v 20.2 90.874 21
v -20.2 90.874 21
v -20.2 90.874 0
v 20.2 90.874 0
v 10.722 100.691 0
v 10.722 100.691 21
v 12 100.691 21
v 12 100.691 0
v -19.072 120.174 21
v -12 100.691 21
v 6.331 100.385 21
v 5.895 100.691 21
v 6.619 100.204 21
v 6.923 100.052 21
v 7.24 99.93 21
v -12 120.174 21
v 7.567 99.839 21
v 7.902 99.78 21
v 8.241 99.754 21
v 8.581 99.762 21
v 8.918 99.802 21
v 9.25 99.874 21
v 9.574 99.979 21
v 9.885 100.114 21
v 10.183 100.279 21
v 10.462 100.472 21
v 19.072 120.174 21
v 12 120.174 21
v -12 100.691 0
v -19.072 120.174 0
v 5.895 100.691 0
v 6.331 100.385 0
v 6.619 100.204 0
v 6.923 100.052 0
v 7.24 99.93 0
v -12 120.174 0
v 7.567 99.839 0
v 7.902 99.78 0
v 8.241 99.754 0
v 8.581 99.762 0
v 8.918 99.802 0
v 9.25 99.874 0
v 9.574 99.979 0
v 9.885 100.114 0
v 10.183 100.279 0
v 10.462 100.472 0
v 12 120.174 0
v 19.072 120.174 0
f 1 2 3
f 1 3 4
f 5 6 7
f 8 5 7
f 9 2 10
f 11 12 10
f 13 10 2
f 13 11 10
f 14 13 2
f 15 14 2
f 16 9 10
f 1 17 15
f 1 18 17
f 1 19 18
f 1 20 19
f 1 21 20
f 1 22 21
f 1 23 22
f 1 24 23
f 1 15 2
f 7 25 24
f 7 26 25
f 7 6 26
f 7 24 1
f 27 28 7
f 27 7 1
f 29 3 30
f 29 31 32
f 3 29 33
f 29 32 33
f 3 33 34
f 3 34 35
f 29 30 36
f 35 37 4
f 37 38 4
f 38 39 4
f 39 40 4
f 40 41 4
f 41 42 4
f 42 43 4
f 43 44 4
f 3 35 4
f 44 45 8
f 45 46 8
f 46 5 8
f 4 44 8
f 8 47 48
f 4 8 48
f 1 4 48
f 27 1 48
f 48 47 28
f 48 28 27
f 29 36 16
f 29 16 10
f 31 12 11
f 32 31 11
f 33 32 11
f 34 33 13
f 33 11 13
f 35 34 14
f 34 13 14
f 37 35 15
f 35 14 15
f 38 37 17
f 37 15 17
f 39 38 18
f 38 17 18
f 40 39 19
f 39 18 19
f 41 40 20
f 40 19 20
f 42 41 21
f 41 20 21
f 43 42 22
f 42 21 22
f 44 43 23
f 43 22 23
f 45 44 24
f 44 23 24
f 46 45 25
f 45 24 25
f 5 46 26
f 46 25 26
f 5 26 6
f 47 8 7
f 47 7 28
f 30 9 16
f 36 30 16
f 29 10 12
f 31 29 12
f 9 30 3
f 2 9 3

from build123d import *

# Parameters (mm, degrees)
SKETCH1_R               = 1.5
SKETCH1_R_2             = 3.95
MAIN_BODY_LINK_B1_DEPTH = 21
CUT_EXTRUDE1_REACH      = 170.233
PULLEYIDLER_DEPTH       = 21
FILLET1_R               = 1
SKETCH4_W               = 40.4
SKETCH4_H               = 7.4
SKETCH4_W_2             = 38.1446978
SKETCH4_H_2             = 45.516821784
CUT_EXTRUDE2_DEPTH      = 169.23348591
CUT_EXTRUDE4_DEPTH      = 124.656147707


with BuildPart() as part:
    # Sketch1 → Main Body Link B1 (new body)
    with BuildSketch(Plane.XY):
        with BuildLine():
            Line((0, 83.474052381), (9.1, 83.474052381))
            Line((9.1, 83.474052381), (9.1, 89.474052381))
            Line((9.1, 89.474052381), (11.1, 89.474052381))
            Line((11.1, 89.474052381), (11.1, 83.474052381))
            Line((11.1, 83.474052381), (20.2, 83.474052381))
            Line((20.2, 83.474052381), (20.2, 90.874052381))
            Line((20.2, 90.874052381), (17.986683974, 148.383116621))
            ThreePointArc((17.986683974, 148.383116621), (0, 165.690874165), (-17.986683974, 148.383116621))
            Line((-17.986683974, 148.383116621), (-20.2, 90.874052381))
            Line((-20.2, 90.874052381), (-20.2, 83.474052381))
            Line((-20.2, 83.474052381), (-11.1, 83.474052381))
            Line((-11.1, 83.474052381), (-11.1, 89.474052381))
            Line((-11.1, 89.474052381), (-9.1, 89.474052381))
            Line((-9.1, 89.474052381), (-9.1, 83.474052381))
            Line((-9.1, 83.474052381), (0, 83.474052381))
        make_face()
        with Locations(Location((5.2, 88.124052381, 0), (0, 0, 180))):
            Circle(SKETCH1_R, mode=Mode.SUBTRACT)
        with Locations(Location((15, 88.124052381, 0), (0, 0, 180))):
            Circle(SKETCH1_R, mode=Mode.SUBTRACT)
        with Locations(Location((-15, 88.124052381, 0), (0, 0, 180))):
            Circle(SKETCH1_R, mode=Mode.SUBTRACT)
        with Locations(Location((-5.2, 88.124052381, 0), (0, 0, 180))):
            Circle(SKETCH1_R, mode=Mode.SUBTRACT)
        with Locations(Location((0, 147.690874165, 0), (0, 0, 180))):
            Circle(SKETCH1_R_2, mode=Mode.SUBTRACT)
    extrude(amount=MAIN_BODY_LINK_B1_DEPTH)

    # Sketch2 → Cut-Extrude1 (cut, up to next)
    with BuildSketch(Plane.XY.offset(21), mode=Mode.PRIVATE) as cut_extrude1_sk1:
        Polygon((-3.278172542, 117.482670232), (12, 128.172168466), (12, 106.793171999), align=None)
    cut_extrude1_tool1 = extrude(cut_extrude1_sk1.sketch, amount=-CUT_EXTRUDE1_REACH, mode=Mode.PRIVATE) & part.part
    # Sketch2 → Cut-Extrude1 (cut, up to next)
    with BuildSketch(Plane.XY.offset(21), mode=Mode.PRIVATE) as cut_extrude1_sk2:
        with BuildLine():
            ThreePointArc((-12, 134.2744663), (-7.774454217, 131.456408925), (-2.929911079, 129.930929878))
            Line((-2.929911079, 129.930929878), (-12, 123.584968066))
            Line((-12, 123.584968066), (-12, 134.2744663))
        make_face()
    cut_extrude1_tool2 = extrude(cut_extrude1_sk2.sketch, amount=-CUT_EXTRUDE1_REACH, mode=Mode.PRIVATE) & part.part
    # Sketch2 → Cut-Extrude1 (cut, up to next)
    with BuildSketch(Plane.XY.offset(21), mode=Mode.PRIVATE) as cut_extrude1_sk3:
        Polygon((-12, 111.380372399), (-12, 100.690874165), (3.278172542, 100.690874165), align=None)
    cut_extrude1_tool3 = extrude(cut_extrude1_sk3.sketch, amount=-CUT_EXTRUDE1_REACH, mode=Mode.PRIVATE) & part.part
    add(cut_extrude1_tool1.solids().sort_by_distance((6.907276, 117.48267, 21))[0], mode=Mode.SUBTRACT)
    add(cut_extrude1_tool2.solids().sort_by_distance((-9.12997, 128.978342, 21))[0], mode=Mode.SUBTRACT)
    add(cut_extrude1_tool3.solids().sort_by_distance((-6.907276, 104.25404, 21))[0], mode=Mode.SUBTRACT)

    # Sketch3 → PulleyIdler (cut)
    with BuildSketch(Plane.XY.offset(21)):
        with BuildLine():
            Line((-5.959092644, 108.984491566), (6.331359583, 100.385376259))
            ThreePointArc((6.331359583, 100.385376259), (11.205592008, 101.246688207), (10.34428006, 106.120920631))
            Line((10.34428006, 106.120920631), (-1.946172167, 114.720035938))
            ThreePointArc((-1.946172167, 114.720035938), (-6.820404592, 113.85872399), (-5.959092644, 108.984491566))
        make_face()
    extrude(amount=-PULLEYIDLER_DEPTH, mode=Mode.SUBTRACT)

    # Fillet1
    fillet1_edges = [part.edges().sort_by_distance(p)[0] for p in [
        (-3.278172542, 117.482670232, 10.5),
        (12, 128.172168466, 10.5),
        (12, 106.793171999, 10.5),
        (-12, 134.2744663, 10.5),
        (-2.929911079, 129.930929878, 10.5),
        (-12, 123.584968066, 10.5),
        (-12, 111.380372399, 10.5),
        (3.278172542, 100.690874165, 10.5),
        (-12, 100.690874165, 10.5),
    ]]
    fillet(fillet1_edges, radius=FILLET1_R)

    # Sketch4 → Cut-Extrude2 (cut, through all)
    with BuildSketch(Plane.XY.offset(21)):
        with Locations((0, 87.174052381)):
            Rectangle(SKETCH4_W, SKETCH4_H)
        with Locations((0, 142.932463273)):
            Rectangle(SKETCH4_W_2, SKETCH4_H_2)
    extrude(amount=-CUT_EXTRUDE2_DEPTH, mode=Mode.SUBTRACT)

    # Sketch5 → Cut-Extrude4 (cut, through all)
    with BuildSketch(Plane.XY.offset(21)):
        with BuildLine():
            Line((-12, 100.690874165), (5.894720779, 100.690874165))
            Line((5.894720779, 100.690874165), (6.331359583, 100.385376259))
            ThreePointArc((6.331359583, 100.385376259), (8.580755157, 99.761589707), (10.722091306, 100.690874165))
            Line((10.722091306, 100.690874165), (12, 100.690874165))
            Line((12, 100.690874165), (12, 120.174052381))
            Line((12, 120.174052381), (-12, 120.174052381))
            Line((-12, 120.174052381), (-12, 100.690874165))
        make_face()
    extrude(amount=-CUT_EXTRUDE4_DEPTH, mode=Mode.SUBTRACT)


solid = part.part
